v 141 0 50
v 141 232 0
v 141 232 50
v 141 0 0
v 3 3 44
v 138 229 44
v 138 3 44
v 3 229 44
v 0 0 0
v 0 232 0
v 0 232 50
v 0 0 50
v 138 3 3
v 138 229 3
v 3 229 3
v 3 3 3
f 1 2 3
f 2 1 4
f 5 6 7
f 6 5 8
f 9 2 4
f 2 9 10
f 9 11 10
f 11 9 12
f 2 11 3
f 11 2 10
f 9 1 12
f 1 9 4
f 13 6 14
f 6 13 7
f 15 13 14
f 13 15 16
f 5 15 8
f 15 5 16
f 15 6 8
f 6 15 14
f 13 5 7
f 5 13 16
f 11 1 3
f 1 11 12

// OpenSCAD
// Medidas de la botella
bottle_len = 125;   // altura de la botella (irá tumbada)
bottle_d   = 36;    // diámetro
padding    = 5;     // holgura alrededor

// Número de botellas a guardar
n = 6;  // ajusta aquí cuántas quieres almacenar

// Paredes
thickness = 3;

// Dimensiones de la caja interna
inner_x = bottle_len;
inner_y = n*bottle_d;
inner_z = bottle_d;

// Caja externa con paredes
outer_x = inner_x + 2*thickness + 2*padding;
outer_y = inner_y + 2*thickness + 2*padding;
outer_z = inner_z + thickness + padding;

// Caja principal
module caja() {
    difference() {
        cube([outer_x, outer_y, outer_z]);
        translate([thickness, thickness, thickness])
            cube([outer_x-2*thickness,
                  outer_y-2*thickness,
                  outer_z-thickness]);
    }
}

// Tapa simple que cubre por encima
module tapa() {
    translate([0,0,outer_z])
        cube([outer_x, outer_y, thickness+3]);
}

// Ensamblado
caja();
tapa();
